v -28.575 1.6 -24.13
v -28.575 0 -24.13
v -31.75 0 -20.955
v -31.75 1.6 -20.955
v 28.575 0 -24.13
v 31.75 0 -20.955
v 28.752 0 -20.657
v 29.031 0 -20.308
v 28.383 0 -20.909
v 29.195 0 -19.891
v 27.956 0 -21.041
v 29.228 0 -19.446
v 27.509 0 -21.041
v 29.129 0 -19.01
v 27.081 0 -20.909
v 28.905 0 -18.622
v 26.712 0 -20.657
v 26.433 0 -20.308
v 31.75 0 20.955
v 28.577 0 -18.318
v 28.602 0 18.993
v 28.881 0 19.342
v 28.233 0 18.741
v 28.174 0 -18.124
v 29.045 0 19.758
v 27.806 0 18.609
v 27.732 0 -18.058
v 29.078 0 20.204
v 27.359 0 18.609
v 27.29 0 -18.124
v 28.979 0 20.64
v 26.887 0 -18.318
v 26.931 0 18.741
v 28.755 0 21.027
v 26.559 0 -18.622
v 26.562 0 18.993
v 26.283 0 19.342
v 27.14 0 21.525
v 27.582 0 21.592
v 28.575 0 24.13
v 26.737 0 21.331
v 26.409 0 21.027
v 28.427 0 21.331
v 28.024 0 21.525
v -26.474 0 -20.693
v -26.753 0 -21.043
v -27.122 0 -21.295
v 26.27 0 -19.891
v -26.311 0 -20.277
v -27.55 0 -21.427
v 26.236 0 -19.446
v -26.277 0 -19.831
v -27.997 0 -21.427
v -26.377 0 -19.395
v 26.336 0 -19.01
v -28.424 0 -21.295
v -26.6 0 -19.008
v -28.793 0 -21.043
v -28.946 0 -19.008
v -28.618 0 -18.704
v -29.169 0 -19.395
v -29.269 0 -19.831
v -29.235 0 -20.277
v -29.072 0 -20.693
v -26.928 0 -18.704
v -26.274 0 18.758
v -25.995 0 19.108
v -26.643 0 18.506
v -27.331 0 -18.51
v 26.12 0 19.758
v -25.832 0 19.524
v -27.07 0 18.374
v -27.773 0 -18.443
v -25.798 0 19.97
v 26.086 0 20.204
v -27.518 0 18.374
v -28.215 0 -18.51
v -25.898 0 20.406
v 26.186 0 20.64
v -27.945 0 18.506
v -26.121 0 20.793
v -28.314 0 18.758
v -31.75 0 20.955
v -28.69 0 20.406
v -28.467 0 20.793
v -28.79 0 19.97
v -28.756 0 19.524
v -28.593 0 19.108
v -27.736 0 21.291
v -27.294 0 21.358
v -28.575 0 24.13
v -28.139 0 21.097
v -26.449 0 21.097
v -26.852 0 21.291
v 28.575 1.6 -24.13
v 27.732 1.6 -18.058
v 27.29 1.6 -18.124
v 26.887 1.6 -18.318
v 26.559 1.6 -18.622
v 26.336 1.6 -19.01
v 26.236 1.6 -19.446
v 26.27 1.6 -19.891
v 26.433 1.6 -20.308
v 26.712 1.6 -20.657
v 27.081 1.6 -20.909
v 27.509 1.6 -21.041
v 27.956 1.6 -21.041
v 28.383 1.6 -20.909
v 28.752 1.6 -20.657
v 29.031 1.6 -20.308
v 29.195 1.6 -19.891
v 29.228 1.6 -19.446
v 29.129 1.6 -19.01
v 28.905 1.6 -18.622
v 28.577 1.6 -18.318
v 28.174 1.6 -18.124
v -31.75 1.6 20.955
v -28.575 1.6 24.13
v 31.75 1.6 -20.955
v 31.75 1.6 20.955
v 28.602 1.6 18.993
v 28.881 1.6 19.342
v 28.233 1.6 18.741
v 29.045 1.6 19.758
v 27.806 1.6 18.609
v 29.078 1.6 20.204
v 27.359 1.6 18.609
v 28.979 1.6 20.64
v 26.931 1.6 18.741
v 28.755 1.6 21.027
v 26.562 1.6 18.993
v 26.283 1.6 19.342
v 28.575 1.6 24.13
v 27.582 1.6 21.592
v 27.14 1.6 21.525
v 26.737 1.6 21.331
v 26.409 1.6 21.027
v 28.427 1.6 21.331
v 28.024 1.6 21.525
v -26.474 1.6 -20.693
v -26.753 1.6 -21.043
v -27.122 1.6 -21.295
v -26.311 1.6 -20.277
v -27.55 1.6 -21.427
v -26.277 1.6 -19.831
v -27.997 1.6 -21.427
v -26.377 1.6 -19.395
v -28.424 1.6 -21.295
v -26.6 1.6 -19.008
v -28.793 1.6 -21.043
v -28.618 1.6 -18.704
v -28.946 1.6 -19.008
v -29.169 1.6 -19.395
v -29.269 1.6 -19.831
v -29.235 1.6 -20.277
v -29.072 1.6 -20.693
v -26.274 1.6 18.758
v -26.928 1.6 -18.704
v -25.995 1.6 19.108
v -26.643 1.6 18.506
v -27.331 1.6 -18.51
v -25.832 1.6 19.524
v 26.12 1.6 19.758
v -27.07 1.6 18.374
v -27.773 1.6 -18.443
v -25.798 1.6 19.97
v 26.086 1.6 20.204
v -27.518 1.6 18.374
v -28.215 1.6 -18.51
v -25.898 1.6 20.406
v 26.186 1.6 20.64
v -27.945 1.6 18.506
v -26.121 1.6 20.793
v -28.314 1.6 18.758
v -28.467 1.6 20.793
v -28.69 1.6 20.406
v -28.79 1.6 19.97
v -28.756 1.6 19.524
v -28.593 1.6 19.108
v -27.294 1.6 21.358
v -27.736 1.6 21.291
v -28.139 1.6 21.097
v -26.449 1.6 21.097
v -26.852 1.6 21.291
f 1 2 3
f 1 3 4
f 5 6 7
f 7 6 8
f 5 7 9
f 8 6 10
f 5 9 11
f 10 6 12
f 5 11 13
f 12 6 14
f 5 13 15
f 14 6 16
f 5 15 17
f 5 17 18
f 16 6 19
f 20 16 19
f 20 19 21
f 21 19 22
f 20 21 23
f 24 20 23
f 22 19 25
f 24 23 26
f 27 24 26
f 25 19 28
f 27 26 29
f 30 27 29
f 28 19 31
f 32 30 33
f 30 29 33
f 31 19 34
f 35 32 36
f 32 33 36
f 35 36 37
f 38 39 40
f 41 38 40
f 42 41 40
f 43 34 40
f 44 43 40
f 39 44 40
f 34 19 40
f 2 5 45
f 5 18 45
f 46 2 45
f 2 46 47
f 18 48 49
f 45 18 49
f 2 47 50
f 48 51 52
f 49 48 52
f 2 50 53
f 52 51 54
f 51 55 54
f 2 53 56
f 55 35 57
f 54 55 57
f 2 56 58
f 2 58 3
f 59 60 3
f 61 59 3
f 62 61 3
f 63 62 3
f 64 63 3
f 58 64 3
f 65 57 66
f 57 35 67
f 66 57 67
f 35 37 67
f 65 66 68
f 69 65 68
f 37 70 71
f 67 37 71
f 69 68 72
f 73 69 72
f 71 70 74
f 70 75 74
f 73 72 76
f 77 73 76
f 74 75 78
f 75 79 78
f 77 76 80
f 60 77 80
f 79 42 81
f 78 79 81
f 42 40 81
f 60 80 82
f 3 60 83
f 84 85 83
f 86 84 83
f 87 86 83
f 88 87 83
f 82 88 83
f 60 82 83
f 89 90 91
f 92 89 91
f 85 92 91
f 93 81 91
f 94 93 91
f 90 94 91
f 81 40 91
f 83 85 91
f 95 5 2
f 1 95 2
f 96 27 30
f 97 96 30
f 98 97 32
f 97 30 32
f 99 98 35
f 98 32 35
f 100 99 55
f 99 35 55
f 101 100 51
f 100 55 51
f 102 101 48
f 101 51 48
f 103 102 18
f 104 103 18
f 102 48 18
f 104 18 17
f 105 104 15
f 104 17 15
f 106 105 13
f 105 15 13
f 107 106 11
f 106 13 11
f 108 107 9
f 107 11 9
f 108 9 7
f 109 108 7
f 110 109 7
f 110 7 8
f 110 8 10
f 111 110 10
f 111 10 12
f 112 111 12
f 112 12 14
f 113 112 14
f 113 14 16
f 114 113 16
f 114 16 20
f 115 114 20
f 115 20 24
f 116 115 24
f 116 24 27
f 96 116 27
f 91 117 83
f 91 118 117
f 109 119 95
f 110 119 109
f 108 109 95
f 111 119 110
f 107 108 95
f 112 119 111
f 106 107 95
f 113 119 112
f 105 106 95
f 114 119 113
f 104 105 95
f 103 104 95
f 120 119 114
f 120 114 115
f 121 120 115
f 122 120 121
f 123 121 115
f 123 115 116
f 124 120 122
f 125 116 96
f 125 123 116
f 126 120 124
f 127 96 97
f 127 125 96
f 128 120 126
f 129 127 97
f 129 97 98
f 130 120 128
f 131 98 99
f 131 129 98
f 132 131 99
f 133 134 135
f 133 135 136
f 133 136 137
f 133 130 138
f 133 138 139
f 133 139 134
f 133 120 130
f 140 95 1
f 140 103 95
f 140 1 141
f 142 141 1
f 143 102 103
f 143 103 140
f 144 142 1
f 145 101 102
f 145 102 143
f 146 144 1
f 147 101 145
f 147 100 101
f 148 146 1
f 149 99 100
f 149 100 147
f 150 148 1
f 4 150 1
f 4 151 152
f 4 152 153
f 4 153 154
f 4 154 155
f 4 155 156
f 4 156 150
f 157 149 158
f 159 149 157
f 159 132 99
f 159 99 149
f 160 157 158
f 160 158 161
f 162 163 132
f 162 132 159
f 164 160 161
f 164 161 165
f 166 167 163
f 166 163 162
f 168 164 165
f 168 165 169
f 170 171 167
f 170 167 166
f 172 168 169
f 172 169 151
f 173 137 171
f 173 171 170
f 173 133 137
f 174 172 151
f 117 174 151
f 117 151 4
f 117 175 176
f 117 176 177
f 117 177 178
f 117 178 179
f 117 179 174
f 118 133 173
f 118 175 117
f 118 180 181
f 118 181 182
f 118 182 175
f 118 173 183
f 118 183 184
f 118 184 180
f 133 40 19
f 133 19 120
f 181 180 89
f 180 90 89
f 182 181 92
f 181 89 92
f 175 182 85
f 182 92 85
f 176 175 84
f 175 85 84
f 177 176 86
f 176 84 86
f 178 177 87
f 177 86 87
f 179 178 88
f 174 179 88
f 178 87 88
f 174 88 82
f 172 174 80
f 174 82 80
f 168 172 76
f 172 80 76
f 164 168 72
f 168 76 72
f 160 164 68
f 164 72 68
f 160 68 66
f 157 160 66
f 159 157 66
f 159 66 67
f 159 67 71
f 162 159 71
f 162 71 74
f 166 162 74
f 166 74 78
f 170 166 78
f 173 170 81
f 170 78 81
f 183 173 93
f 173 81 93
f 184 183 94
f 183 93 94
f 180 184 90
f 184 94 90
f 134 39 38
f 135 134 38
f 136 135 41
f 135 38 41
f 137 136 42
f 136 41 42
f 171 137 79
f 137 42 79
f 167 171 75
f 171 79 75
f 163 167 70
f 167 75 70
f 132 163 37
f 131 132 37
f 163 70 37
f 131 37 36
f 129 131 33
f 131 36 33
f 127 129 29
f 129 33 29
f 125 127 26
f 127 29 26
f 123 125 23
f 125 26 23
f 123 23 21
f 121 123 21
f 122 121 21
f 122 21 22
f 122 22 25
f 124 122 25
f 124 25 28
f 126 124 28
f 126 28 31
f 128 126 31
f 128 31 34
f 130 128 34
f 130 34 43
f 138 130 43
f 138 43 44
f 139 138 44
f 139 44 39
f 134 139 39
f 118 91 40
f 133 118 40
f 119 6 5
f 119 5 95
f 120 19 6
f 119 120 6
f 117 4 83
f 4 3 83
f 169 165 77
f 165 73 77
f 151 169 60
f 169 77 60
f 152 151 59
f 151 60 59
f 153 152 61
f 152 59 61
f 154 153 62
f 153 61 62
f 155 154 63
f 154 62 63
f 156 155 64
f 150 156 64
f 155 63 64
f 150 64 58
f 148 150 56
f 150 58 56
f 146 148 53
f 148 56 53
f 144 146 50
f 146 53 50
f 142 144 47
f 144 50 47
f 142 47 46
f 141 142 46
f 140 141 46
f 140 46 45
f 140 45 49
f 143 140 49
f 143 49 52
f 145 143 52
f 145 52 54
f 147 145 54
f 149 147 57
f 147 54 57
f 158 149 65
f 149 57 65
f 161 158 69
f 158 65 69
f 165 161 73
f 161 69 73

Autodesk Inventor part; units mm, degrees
ref_plane "YZ Plane" through (0, 0, 0) normal (1, 0, 0) x (0, 1, 0)
ref_plane "XZ Plane" through (0, 0, 0) normal (0, 1, 0) x (-1, 0, 0)
ref_plane "XY Plane" through (0, 0, 0) normal (0, 0, 1) x (1, 0, 0)
sketch "Sketch1" plane through (0, 0, 0) normal (0, 1, 0) x (-1, 0, 0)
  line L0 (31.75, 24.13) -> (-31.75, 24.13)
  line L1 (-31.75, 24.13) -> (-31.75, -24.13)
  line L2 (-31.75, -24.13) -> (31.75, -24.13)
  line L3 (31.75, -24.13) -> (31.75, 24.13)
  line L4 (31.75, 24.13) -> (-31.75, -24.13) construction
  line L5 (-31.75, 24.13) -> (31.75, -24.13) construction
  point P0 (0, 0)
  dimension "d0" = 63.5
  dimension "d1" = 48.26
extrude "Extrusion1" add sketch "Sketch1" along normal blind 1.6
chamfer "Chamfer1" distance 3.175 angle 45 4 edges at (31.75, 0.8, 24.13) (31.75, 0.8, -24.13) (-31.75, 0.8, -24.13) (-31.75, 0.8, 24.13)
sketch "Sketch2" plane through (0, 1.6, 0) normal (0, 1, 0) x (1, 0, 0)
  point P0 (0, 0)
  point P1 (-27.7731, 19.9434)
  point P2 (27.7322, 19.5576)
  point P3 (-27.294, -19.8576)
  point P4 (27.5822, -20.0921)
hole "Hole1" at (-27.7731, 1.6, -19.9434) at (27.7322, 1.6, -19.5576) at (-27.294, 1.6, 19.8576) at (27.5822, 1.6, 20.0921) direction (0, -1, 0) diameter 3 depth 95.25 tip angle 118
properties part number "PCB" material "ABS Plastic"
